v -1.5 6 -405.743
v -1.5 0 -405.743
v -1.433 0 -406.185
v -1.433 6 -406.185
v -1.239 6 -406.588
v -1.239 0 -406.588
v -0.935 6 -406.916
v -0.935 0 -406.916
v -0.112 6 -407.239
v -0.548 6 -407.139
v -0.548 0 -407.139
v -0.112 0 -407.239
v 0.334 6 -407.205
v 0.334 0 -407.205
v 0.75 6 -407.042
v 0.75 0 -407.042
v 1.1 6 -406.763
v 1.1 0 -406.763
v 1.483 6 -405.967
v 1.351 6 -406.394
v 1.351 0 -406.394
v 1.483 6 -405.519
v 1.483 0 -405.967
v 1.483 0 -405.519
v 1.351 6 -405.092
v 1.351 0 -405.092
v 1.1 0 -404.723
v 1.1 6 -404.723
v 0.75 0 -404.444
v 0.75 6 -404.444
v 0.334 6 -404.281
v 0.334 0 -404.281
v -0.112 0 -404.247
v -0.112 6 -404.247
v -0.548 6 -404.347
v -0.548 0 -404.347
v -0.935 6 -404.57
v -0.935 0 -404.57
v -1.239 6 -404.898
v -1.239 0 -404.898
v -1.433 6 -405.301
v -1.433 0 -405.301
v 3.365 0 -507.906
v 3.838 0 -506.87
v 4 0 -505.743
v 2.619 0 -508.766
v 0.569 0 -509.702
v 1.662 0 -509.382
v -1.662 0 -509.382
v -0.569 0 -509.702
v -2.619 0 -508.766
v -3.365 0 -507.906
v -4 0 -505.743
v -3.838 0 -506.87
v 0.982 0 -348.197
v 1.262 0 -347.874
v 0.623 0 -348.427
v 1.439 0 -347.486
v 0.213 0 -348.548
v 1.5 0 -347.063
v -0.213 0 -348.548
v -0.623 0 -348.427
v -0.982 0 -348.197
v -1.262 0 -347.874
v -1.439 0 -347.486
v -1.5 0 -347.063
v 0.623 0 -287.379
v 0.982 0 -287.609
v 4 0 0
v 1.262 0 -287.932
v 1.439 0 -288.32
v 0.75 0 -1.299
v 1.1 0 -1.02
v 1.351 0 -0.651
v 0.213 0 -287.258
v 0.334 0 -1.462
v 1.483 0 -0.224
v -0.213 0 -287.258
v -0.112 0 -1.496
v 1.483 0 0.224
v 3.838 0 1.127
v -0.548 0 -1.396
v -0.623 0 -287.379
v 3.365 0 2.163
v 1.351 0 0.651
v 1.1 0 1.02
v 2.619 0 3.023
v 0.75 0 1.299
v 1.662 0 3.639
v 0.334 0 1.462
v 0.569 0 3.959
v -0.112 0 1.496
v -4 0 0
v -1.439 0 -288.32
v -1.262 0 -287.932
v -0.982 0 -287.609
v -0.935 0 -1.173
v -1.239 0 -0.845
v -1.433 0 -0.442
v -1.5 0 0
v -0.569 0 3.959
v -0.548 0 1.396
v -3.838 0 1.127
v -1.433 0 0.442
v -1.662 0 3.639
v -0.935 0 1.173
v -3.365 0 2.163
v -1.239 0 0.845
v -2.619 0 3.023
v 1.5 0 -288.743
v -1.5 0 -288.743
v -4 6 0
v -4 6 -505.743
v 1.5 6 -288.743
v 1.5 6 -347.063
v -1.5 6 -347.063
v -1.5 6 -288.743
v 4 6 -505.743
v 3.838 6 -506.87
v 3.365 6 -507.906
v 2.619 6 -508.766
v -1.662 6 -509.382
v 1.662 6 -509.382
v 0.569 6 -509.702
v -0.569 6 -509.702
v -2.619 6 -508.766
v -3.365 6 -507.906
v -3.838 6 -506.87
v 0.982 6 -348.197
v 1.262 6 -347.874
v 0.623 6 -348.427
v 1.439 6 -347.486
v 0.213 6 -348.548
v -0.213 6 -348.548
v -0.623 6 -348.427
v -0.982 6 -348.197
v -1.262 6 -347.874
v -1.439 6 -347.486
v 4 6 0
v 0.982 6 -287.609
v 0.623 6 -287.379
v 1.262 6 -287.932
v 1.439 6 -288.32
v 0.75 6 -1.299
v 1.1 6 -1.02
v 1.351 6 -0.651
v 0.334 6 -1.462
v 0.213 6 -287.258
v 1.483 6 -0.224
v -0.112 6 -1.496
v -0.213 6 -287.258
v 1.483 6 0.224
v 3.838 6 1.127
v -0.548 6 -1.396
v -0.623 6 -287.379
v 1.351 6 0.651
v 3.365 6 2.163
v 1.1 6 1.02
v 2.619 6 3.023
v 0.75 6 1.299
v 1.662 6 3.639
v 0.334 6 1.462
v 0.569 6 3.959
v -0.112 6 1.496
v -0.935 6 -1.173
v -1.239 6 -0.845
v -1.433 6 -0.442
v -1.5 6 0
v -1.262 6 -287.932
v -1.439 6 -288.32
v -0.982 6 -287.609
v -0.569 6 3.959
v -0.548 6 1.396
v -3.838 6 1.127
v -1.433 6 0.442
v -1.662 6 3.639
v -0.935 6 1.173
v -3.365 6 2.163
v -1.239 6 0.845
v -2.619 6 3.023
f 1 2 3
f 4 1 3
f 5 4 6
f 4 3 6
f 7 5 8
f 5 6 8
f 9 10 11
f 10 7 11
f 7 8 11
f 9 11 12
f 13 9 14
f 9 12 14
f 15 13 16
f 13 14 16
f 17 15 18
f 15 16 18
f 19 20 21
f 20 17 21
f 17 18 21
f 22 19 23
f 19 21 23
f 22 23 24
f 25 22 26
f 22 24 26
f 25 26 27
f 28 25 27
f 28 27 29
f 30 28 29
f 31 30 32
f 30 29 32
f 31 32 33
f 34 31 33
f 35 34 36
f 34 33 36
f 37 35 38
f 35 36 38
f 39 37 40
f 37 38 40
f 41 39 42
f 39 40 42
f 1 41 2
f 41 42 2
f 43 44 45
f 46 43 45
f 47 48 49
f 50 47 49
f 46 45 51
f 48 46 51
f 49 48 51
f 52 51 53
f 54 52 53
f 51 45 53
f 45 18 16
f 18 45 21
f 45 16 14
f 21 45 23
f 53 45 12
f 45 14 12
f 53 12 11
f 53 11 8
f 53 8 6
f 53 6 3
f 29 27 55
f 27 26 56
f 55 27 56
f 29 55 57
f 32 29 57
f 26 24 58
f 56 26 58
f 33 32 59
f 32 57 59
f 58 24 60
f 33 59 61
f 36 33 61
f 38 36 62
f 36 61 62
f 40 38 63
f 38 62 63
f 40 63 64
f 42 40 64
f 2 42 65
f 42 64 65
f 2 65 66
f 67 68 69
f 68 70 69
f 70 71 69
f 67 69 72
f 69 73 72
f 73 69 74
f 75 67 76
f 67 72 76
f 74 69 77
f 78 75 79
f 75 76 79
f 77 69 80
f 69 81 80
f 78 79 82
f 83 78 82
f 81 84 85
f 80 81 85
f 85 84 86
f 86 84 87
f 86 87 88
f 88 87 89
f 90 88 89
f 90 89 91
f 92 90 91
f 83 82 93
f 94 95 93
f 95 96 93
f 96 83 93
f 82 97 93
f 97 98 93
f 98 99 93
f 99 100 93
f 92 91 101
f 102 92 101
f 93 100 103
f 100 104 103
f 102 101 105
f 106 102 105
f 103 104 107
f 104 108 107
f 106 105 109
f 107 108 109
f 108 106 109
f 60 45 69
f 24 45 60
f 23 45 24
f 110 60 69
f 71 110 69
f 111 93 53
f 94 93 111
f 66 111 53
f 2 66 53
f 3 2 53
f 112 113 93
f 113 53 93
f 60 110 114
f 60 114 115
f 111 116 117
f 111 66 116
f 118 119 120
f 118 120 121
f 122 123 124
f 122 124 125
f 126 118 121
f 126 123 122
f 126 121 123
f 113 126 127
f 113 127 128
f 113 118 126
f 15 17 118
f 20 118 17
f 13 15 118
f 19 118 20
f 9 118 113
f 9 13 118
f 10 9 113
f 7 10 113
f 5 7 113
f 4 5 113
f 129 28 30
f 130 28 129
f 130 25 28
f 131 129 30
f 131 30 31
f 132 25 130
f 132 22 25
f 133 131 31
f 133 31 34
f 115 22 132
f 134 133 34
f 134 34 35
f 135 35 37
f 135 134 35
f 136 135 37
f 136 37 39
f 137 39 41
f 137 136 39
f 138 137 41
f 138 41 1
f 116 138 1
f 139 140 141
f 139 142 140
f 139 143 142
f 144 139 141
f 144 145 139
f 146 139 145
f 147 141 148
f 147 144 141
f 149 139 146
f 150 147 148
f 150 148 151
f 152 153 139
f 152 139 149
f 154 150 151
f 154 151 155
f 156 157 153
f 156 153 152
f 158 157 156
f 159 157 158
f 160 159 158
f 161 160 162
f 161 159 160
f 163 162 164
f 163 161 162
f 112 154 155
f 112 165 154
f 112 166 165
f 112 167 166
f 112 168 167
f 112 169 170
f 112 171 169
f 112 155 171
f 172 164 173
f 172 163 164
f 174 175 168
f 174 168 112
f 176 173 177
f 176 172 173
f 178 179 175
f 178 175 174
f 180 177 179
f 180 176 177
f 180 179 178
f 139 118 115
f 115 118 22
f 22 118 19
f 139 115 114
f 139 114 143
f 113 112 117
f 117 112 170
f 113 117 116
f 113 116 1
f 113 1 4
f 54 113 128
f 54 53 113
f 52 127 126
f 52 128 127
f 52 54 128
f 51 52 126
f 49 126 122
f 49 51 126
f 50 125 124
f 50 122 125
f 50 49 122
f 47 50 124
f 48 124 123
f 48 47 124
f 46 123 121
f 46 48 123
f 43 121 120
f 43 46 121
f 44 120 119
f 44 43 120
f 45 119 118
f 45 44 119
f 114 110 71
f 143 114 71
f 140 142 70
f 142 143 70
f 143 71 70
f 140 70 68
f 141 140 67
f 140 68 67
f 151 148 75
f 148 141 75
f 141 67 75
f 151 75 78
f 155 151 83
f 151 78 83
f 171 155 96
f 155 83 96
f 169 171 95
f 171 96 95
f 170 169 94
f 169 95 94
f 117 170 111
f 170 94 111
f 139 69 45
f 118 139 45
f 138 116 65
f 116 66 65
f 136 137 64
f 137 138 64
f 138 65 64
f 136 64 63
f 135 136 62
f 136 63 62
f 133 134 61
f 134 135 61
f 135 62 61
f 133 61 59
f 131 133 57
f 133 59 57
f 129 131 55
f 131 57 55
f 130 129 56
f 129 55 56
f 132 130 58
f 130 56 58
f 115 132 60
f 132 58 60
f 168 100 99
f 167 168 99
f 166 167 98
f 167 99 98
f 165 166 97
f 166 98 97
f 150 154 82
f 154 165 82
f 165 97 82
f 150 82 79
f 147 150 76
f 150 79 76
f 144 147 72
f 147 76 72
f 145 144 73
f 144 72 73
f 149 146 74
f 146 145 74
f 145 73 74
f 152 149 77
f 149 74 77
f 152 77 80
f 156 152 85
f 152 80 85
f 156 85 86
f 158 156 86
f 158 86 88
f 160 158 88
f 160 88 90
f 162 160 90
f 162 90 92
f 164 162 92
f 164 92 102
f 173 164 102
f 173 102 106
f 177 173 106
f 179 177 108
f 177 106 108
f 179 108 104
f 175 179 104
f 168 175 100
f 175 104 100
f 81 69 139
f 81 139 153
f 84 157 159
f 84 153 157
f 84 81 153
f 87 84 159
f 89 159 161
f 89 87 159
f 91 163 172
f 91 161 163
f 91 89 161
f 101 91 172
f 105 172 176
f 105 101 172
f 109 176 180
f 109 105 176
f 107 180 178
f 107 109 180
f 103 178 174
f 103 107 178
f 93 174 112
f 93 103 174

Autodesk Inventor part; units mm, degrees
ref_plane "XZ Plane" through (0, 0, 0) normal (0, 1, 0) x (-1, 0, 0)
ref_plane "XY Plane" through (0, 0, 0) normal (0, 0, 1) x (1, 0, 0)
sketch "Sketch1" plane through (0, 0, 0) normal (0, 1, 0) x (-1, 0, 0)
  line L0 (0, 0) -> (0, -405.743) construction
  line L1 (-4, 0) -> (-4, -405.743)
  line L2 (4, -405.743) -> (4, 0)
  arc A0 (4, 0) -> (-4, 0) centre (0, 0) ccw
  arc A1 (-4, -405.743) -> (4, -405.743) centre (0, -405.743) ccw
  circle A2 centre (0, 0) radius 1.5
  circle A3 centre (0, -405.743) radius 1.5
  line L3 (0, -347.063) -> (0, -288.743) construction
  line L4 (1.5, -347.063) -> (1.5, -288.743)
  line L5 (-1.5, -288.743) -> (-1.5, -347.063)
  arc A4 (-1.5, -347.063) -> (1.5, -347.063) centre (0, -347.063) ccw
  arc A5 (1.5, -288.743) -> (-1.5, -288.743) centre (0, -288.743) ccw
  line L6 (0, -405.743) -> (0, -505.743) construction
  line L7 (-4, -405.743) -> (-4, -505.743)
  line L8 (4, -505.743) -> (4, -405.743)
  arc A6 (4, -405.743) -> (-4, -405.743) centre (0, -405.743) ccw
  arc A7 (-4, -505.743) -> (4, -505.743) centre (0, -505.743) ccw
  point P0 (0, -202.8715)
  point P1 (0, -317.903)
  point P2 (0, -455.743)
  dimension "d0" = 8
  dimension "d1" = 405.743
  dimension "d2" = 3
  dimension "d3" = 3
  dimension "d20" = 3
  dimension "d21" = 58.68
  dimension "d22" = 117
  dimension "d23" = 8
  dimension "d24" = 100
extrude "Extrusion1" add sketch "Sketch1" along normal blind 6
sketch "Sketch2" plane through (0, 6, 0) normal (0, 1, 0) x (1, 0, 0)
  line L0 (-4, 505.743) -> (-4, 0) projected
  arc A0 (-4, 0) -> (4, 0) centre (0, 0) ccw projected
  line L1 (4, 0) -> (4, 505.743) projected
  arc A1 (4, 505.743) -> (-4, 505.743) centre (0, 505.743) ccw projected
  arc A2 (1.5, 347.063) -> (-1.5, 347.063) centre (0, 347.063) ccw projected
  line L2 (1.5, 347.063) -> (1.5, 288.743) projected
  arc A3 (-1.5, 288.743) -> (1.5, 288.743) centre (0, 288.743) ccw projected
  line L3 (-1.5, 288.743) -> (-1.5, 347.063) projected
  circle A4 centre (0, 405.743) radius 1.5 projected
  circle A5 centre (0, 0) radius 1.5 projected
  line L4 (-4, 505.743) -> (-4, 0) projected
  line L5 (-4, 252.8715) -> (0, 244.2935)
  line L6 (0, 244.2935) -> (4, 252.8715)
  line L7 (4, 0) -> (4, 505.743) projected
  dimension "d25" = 25
  dimension "d26" = 25
extrude "Extrusion2" [suppressed]
